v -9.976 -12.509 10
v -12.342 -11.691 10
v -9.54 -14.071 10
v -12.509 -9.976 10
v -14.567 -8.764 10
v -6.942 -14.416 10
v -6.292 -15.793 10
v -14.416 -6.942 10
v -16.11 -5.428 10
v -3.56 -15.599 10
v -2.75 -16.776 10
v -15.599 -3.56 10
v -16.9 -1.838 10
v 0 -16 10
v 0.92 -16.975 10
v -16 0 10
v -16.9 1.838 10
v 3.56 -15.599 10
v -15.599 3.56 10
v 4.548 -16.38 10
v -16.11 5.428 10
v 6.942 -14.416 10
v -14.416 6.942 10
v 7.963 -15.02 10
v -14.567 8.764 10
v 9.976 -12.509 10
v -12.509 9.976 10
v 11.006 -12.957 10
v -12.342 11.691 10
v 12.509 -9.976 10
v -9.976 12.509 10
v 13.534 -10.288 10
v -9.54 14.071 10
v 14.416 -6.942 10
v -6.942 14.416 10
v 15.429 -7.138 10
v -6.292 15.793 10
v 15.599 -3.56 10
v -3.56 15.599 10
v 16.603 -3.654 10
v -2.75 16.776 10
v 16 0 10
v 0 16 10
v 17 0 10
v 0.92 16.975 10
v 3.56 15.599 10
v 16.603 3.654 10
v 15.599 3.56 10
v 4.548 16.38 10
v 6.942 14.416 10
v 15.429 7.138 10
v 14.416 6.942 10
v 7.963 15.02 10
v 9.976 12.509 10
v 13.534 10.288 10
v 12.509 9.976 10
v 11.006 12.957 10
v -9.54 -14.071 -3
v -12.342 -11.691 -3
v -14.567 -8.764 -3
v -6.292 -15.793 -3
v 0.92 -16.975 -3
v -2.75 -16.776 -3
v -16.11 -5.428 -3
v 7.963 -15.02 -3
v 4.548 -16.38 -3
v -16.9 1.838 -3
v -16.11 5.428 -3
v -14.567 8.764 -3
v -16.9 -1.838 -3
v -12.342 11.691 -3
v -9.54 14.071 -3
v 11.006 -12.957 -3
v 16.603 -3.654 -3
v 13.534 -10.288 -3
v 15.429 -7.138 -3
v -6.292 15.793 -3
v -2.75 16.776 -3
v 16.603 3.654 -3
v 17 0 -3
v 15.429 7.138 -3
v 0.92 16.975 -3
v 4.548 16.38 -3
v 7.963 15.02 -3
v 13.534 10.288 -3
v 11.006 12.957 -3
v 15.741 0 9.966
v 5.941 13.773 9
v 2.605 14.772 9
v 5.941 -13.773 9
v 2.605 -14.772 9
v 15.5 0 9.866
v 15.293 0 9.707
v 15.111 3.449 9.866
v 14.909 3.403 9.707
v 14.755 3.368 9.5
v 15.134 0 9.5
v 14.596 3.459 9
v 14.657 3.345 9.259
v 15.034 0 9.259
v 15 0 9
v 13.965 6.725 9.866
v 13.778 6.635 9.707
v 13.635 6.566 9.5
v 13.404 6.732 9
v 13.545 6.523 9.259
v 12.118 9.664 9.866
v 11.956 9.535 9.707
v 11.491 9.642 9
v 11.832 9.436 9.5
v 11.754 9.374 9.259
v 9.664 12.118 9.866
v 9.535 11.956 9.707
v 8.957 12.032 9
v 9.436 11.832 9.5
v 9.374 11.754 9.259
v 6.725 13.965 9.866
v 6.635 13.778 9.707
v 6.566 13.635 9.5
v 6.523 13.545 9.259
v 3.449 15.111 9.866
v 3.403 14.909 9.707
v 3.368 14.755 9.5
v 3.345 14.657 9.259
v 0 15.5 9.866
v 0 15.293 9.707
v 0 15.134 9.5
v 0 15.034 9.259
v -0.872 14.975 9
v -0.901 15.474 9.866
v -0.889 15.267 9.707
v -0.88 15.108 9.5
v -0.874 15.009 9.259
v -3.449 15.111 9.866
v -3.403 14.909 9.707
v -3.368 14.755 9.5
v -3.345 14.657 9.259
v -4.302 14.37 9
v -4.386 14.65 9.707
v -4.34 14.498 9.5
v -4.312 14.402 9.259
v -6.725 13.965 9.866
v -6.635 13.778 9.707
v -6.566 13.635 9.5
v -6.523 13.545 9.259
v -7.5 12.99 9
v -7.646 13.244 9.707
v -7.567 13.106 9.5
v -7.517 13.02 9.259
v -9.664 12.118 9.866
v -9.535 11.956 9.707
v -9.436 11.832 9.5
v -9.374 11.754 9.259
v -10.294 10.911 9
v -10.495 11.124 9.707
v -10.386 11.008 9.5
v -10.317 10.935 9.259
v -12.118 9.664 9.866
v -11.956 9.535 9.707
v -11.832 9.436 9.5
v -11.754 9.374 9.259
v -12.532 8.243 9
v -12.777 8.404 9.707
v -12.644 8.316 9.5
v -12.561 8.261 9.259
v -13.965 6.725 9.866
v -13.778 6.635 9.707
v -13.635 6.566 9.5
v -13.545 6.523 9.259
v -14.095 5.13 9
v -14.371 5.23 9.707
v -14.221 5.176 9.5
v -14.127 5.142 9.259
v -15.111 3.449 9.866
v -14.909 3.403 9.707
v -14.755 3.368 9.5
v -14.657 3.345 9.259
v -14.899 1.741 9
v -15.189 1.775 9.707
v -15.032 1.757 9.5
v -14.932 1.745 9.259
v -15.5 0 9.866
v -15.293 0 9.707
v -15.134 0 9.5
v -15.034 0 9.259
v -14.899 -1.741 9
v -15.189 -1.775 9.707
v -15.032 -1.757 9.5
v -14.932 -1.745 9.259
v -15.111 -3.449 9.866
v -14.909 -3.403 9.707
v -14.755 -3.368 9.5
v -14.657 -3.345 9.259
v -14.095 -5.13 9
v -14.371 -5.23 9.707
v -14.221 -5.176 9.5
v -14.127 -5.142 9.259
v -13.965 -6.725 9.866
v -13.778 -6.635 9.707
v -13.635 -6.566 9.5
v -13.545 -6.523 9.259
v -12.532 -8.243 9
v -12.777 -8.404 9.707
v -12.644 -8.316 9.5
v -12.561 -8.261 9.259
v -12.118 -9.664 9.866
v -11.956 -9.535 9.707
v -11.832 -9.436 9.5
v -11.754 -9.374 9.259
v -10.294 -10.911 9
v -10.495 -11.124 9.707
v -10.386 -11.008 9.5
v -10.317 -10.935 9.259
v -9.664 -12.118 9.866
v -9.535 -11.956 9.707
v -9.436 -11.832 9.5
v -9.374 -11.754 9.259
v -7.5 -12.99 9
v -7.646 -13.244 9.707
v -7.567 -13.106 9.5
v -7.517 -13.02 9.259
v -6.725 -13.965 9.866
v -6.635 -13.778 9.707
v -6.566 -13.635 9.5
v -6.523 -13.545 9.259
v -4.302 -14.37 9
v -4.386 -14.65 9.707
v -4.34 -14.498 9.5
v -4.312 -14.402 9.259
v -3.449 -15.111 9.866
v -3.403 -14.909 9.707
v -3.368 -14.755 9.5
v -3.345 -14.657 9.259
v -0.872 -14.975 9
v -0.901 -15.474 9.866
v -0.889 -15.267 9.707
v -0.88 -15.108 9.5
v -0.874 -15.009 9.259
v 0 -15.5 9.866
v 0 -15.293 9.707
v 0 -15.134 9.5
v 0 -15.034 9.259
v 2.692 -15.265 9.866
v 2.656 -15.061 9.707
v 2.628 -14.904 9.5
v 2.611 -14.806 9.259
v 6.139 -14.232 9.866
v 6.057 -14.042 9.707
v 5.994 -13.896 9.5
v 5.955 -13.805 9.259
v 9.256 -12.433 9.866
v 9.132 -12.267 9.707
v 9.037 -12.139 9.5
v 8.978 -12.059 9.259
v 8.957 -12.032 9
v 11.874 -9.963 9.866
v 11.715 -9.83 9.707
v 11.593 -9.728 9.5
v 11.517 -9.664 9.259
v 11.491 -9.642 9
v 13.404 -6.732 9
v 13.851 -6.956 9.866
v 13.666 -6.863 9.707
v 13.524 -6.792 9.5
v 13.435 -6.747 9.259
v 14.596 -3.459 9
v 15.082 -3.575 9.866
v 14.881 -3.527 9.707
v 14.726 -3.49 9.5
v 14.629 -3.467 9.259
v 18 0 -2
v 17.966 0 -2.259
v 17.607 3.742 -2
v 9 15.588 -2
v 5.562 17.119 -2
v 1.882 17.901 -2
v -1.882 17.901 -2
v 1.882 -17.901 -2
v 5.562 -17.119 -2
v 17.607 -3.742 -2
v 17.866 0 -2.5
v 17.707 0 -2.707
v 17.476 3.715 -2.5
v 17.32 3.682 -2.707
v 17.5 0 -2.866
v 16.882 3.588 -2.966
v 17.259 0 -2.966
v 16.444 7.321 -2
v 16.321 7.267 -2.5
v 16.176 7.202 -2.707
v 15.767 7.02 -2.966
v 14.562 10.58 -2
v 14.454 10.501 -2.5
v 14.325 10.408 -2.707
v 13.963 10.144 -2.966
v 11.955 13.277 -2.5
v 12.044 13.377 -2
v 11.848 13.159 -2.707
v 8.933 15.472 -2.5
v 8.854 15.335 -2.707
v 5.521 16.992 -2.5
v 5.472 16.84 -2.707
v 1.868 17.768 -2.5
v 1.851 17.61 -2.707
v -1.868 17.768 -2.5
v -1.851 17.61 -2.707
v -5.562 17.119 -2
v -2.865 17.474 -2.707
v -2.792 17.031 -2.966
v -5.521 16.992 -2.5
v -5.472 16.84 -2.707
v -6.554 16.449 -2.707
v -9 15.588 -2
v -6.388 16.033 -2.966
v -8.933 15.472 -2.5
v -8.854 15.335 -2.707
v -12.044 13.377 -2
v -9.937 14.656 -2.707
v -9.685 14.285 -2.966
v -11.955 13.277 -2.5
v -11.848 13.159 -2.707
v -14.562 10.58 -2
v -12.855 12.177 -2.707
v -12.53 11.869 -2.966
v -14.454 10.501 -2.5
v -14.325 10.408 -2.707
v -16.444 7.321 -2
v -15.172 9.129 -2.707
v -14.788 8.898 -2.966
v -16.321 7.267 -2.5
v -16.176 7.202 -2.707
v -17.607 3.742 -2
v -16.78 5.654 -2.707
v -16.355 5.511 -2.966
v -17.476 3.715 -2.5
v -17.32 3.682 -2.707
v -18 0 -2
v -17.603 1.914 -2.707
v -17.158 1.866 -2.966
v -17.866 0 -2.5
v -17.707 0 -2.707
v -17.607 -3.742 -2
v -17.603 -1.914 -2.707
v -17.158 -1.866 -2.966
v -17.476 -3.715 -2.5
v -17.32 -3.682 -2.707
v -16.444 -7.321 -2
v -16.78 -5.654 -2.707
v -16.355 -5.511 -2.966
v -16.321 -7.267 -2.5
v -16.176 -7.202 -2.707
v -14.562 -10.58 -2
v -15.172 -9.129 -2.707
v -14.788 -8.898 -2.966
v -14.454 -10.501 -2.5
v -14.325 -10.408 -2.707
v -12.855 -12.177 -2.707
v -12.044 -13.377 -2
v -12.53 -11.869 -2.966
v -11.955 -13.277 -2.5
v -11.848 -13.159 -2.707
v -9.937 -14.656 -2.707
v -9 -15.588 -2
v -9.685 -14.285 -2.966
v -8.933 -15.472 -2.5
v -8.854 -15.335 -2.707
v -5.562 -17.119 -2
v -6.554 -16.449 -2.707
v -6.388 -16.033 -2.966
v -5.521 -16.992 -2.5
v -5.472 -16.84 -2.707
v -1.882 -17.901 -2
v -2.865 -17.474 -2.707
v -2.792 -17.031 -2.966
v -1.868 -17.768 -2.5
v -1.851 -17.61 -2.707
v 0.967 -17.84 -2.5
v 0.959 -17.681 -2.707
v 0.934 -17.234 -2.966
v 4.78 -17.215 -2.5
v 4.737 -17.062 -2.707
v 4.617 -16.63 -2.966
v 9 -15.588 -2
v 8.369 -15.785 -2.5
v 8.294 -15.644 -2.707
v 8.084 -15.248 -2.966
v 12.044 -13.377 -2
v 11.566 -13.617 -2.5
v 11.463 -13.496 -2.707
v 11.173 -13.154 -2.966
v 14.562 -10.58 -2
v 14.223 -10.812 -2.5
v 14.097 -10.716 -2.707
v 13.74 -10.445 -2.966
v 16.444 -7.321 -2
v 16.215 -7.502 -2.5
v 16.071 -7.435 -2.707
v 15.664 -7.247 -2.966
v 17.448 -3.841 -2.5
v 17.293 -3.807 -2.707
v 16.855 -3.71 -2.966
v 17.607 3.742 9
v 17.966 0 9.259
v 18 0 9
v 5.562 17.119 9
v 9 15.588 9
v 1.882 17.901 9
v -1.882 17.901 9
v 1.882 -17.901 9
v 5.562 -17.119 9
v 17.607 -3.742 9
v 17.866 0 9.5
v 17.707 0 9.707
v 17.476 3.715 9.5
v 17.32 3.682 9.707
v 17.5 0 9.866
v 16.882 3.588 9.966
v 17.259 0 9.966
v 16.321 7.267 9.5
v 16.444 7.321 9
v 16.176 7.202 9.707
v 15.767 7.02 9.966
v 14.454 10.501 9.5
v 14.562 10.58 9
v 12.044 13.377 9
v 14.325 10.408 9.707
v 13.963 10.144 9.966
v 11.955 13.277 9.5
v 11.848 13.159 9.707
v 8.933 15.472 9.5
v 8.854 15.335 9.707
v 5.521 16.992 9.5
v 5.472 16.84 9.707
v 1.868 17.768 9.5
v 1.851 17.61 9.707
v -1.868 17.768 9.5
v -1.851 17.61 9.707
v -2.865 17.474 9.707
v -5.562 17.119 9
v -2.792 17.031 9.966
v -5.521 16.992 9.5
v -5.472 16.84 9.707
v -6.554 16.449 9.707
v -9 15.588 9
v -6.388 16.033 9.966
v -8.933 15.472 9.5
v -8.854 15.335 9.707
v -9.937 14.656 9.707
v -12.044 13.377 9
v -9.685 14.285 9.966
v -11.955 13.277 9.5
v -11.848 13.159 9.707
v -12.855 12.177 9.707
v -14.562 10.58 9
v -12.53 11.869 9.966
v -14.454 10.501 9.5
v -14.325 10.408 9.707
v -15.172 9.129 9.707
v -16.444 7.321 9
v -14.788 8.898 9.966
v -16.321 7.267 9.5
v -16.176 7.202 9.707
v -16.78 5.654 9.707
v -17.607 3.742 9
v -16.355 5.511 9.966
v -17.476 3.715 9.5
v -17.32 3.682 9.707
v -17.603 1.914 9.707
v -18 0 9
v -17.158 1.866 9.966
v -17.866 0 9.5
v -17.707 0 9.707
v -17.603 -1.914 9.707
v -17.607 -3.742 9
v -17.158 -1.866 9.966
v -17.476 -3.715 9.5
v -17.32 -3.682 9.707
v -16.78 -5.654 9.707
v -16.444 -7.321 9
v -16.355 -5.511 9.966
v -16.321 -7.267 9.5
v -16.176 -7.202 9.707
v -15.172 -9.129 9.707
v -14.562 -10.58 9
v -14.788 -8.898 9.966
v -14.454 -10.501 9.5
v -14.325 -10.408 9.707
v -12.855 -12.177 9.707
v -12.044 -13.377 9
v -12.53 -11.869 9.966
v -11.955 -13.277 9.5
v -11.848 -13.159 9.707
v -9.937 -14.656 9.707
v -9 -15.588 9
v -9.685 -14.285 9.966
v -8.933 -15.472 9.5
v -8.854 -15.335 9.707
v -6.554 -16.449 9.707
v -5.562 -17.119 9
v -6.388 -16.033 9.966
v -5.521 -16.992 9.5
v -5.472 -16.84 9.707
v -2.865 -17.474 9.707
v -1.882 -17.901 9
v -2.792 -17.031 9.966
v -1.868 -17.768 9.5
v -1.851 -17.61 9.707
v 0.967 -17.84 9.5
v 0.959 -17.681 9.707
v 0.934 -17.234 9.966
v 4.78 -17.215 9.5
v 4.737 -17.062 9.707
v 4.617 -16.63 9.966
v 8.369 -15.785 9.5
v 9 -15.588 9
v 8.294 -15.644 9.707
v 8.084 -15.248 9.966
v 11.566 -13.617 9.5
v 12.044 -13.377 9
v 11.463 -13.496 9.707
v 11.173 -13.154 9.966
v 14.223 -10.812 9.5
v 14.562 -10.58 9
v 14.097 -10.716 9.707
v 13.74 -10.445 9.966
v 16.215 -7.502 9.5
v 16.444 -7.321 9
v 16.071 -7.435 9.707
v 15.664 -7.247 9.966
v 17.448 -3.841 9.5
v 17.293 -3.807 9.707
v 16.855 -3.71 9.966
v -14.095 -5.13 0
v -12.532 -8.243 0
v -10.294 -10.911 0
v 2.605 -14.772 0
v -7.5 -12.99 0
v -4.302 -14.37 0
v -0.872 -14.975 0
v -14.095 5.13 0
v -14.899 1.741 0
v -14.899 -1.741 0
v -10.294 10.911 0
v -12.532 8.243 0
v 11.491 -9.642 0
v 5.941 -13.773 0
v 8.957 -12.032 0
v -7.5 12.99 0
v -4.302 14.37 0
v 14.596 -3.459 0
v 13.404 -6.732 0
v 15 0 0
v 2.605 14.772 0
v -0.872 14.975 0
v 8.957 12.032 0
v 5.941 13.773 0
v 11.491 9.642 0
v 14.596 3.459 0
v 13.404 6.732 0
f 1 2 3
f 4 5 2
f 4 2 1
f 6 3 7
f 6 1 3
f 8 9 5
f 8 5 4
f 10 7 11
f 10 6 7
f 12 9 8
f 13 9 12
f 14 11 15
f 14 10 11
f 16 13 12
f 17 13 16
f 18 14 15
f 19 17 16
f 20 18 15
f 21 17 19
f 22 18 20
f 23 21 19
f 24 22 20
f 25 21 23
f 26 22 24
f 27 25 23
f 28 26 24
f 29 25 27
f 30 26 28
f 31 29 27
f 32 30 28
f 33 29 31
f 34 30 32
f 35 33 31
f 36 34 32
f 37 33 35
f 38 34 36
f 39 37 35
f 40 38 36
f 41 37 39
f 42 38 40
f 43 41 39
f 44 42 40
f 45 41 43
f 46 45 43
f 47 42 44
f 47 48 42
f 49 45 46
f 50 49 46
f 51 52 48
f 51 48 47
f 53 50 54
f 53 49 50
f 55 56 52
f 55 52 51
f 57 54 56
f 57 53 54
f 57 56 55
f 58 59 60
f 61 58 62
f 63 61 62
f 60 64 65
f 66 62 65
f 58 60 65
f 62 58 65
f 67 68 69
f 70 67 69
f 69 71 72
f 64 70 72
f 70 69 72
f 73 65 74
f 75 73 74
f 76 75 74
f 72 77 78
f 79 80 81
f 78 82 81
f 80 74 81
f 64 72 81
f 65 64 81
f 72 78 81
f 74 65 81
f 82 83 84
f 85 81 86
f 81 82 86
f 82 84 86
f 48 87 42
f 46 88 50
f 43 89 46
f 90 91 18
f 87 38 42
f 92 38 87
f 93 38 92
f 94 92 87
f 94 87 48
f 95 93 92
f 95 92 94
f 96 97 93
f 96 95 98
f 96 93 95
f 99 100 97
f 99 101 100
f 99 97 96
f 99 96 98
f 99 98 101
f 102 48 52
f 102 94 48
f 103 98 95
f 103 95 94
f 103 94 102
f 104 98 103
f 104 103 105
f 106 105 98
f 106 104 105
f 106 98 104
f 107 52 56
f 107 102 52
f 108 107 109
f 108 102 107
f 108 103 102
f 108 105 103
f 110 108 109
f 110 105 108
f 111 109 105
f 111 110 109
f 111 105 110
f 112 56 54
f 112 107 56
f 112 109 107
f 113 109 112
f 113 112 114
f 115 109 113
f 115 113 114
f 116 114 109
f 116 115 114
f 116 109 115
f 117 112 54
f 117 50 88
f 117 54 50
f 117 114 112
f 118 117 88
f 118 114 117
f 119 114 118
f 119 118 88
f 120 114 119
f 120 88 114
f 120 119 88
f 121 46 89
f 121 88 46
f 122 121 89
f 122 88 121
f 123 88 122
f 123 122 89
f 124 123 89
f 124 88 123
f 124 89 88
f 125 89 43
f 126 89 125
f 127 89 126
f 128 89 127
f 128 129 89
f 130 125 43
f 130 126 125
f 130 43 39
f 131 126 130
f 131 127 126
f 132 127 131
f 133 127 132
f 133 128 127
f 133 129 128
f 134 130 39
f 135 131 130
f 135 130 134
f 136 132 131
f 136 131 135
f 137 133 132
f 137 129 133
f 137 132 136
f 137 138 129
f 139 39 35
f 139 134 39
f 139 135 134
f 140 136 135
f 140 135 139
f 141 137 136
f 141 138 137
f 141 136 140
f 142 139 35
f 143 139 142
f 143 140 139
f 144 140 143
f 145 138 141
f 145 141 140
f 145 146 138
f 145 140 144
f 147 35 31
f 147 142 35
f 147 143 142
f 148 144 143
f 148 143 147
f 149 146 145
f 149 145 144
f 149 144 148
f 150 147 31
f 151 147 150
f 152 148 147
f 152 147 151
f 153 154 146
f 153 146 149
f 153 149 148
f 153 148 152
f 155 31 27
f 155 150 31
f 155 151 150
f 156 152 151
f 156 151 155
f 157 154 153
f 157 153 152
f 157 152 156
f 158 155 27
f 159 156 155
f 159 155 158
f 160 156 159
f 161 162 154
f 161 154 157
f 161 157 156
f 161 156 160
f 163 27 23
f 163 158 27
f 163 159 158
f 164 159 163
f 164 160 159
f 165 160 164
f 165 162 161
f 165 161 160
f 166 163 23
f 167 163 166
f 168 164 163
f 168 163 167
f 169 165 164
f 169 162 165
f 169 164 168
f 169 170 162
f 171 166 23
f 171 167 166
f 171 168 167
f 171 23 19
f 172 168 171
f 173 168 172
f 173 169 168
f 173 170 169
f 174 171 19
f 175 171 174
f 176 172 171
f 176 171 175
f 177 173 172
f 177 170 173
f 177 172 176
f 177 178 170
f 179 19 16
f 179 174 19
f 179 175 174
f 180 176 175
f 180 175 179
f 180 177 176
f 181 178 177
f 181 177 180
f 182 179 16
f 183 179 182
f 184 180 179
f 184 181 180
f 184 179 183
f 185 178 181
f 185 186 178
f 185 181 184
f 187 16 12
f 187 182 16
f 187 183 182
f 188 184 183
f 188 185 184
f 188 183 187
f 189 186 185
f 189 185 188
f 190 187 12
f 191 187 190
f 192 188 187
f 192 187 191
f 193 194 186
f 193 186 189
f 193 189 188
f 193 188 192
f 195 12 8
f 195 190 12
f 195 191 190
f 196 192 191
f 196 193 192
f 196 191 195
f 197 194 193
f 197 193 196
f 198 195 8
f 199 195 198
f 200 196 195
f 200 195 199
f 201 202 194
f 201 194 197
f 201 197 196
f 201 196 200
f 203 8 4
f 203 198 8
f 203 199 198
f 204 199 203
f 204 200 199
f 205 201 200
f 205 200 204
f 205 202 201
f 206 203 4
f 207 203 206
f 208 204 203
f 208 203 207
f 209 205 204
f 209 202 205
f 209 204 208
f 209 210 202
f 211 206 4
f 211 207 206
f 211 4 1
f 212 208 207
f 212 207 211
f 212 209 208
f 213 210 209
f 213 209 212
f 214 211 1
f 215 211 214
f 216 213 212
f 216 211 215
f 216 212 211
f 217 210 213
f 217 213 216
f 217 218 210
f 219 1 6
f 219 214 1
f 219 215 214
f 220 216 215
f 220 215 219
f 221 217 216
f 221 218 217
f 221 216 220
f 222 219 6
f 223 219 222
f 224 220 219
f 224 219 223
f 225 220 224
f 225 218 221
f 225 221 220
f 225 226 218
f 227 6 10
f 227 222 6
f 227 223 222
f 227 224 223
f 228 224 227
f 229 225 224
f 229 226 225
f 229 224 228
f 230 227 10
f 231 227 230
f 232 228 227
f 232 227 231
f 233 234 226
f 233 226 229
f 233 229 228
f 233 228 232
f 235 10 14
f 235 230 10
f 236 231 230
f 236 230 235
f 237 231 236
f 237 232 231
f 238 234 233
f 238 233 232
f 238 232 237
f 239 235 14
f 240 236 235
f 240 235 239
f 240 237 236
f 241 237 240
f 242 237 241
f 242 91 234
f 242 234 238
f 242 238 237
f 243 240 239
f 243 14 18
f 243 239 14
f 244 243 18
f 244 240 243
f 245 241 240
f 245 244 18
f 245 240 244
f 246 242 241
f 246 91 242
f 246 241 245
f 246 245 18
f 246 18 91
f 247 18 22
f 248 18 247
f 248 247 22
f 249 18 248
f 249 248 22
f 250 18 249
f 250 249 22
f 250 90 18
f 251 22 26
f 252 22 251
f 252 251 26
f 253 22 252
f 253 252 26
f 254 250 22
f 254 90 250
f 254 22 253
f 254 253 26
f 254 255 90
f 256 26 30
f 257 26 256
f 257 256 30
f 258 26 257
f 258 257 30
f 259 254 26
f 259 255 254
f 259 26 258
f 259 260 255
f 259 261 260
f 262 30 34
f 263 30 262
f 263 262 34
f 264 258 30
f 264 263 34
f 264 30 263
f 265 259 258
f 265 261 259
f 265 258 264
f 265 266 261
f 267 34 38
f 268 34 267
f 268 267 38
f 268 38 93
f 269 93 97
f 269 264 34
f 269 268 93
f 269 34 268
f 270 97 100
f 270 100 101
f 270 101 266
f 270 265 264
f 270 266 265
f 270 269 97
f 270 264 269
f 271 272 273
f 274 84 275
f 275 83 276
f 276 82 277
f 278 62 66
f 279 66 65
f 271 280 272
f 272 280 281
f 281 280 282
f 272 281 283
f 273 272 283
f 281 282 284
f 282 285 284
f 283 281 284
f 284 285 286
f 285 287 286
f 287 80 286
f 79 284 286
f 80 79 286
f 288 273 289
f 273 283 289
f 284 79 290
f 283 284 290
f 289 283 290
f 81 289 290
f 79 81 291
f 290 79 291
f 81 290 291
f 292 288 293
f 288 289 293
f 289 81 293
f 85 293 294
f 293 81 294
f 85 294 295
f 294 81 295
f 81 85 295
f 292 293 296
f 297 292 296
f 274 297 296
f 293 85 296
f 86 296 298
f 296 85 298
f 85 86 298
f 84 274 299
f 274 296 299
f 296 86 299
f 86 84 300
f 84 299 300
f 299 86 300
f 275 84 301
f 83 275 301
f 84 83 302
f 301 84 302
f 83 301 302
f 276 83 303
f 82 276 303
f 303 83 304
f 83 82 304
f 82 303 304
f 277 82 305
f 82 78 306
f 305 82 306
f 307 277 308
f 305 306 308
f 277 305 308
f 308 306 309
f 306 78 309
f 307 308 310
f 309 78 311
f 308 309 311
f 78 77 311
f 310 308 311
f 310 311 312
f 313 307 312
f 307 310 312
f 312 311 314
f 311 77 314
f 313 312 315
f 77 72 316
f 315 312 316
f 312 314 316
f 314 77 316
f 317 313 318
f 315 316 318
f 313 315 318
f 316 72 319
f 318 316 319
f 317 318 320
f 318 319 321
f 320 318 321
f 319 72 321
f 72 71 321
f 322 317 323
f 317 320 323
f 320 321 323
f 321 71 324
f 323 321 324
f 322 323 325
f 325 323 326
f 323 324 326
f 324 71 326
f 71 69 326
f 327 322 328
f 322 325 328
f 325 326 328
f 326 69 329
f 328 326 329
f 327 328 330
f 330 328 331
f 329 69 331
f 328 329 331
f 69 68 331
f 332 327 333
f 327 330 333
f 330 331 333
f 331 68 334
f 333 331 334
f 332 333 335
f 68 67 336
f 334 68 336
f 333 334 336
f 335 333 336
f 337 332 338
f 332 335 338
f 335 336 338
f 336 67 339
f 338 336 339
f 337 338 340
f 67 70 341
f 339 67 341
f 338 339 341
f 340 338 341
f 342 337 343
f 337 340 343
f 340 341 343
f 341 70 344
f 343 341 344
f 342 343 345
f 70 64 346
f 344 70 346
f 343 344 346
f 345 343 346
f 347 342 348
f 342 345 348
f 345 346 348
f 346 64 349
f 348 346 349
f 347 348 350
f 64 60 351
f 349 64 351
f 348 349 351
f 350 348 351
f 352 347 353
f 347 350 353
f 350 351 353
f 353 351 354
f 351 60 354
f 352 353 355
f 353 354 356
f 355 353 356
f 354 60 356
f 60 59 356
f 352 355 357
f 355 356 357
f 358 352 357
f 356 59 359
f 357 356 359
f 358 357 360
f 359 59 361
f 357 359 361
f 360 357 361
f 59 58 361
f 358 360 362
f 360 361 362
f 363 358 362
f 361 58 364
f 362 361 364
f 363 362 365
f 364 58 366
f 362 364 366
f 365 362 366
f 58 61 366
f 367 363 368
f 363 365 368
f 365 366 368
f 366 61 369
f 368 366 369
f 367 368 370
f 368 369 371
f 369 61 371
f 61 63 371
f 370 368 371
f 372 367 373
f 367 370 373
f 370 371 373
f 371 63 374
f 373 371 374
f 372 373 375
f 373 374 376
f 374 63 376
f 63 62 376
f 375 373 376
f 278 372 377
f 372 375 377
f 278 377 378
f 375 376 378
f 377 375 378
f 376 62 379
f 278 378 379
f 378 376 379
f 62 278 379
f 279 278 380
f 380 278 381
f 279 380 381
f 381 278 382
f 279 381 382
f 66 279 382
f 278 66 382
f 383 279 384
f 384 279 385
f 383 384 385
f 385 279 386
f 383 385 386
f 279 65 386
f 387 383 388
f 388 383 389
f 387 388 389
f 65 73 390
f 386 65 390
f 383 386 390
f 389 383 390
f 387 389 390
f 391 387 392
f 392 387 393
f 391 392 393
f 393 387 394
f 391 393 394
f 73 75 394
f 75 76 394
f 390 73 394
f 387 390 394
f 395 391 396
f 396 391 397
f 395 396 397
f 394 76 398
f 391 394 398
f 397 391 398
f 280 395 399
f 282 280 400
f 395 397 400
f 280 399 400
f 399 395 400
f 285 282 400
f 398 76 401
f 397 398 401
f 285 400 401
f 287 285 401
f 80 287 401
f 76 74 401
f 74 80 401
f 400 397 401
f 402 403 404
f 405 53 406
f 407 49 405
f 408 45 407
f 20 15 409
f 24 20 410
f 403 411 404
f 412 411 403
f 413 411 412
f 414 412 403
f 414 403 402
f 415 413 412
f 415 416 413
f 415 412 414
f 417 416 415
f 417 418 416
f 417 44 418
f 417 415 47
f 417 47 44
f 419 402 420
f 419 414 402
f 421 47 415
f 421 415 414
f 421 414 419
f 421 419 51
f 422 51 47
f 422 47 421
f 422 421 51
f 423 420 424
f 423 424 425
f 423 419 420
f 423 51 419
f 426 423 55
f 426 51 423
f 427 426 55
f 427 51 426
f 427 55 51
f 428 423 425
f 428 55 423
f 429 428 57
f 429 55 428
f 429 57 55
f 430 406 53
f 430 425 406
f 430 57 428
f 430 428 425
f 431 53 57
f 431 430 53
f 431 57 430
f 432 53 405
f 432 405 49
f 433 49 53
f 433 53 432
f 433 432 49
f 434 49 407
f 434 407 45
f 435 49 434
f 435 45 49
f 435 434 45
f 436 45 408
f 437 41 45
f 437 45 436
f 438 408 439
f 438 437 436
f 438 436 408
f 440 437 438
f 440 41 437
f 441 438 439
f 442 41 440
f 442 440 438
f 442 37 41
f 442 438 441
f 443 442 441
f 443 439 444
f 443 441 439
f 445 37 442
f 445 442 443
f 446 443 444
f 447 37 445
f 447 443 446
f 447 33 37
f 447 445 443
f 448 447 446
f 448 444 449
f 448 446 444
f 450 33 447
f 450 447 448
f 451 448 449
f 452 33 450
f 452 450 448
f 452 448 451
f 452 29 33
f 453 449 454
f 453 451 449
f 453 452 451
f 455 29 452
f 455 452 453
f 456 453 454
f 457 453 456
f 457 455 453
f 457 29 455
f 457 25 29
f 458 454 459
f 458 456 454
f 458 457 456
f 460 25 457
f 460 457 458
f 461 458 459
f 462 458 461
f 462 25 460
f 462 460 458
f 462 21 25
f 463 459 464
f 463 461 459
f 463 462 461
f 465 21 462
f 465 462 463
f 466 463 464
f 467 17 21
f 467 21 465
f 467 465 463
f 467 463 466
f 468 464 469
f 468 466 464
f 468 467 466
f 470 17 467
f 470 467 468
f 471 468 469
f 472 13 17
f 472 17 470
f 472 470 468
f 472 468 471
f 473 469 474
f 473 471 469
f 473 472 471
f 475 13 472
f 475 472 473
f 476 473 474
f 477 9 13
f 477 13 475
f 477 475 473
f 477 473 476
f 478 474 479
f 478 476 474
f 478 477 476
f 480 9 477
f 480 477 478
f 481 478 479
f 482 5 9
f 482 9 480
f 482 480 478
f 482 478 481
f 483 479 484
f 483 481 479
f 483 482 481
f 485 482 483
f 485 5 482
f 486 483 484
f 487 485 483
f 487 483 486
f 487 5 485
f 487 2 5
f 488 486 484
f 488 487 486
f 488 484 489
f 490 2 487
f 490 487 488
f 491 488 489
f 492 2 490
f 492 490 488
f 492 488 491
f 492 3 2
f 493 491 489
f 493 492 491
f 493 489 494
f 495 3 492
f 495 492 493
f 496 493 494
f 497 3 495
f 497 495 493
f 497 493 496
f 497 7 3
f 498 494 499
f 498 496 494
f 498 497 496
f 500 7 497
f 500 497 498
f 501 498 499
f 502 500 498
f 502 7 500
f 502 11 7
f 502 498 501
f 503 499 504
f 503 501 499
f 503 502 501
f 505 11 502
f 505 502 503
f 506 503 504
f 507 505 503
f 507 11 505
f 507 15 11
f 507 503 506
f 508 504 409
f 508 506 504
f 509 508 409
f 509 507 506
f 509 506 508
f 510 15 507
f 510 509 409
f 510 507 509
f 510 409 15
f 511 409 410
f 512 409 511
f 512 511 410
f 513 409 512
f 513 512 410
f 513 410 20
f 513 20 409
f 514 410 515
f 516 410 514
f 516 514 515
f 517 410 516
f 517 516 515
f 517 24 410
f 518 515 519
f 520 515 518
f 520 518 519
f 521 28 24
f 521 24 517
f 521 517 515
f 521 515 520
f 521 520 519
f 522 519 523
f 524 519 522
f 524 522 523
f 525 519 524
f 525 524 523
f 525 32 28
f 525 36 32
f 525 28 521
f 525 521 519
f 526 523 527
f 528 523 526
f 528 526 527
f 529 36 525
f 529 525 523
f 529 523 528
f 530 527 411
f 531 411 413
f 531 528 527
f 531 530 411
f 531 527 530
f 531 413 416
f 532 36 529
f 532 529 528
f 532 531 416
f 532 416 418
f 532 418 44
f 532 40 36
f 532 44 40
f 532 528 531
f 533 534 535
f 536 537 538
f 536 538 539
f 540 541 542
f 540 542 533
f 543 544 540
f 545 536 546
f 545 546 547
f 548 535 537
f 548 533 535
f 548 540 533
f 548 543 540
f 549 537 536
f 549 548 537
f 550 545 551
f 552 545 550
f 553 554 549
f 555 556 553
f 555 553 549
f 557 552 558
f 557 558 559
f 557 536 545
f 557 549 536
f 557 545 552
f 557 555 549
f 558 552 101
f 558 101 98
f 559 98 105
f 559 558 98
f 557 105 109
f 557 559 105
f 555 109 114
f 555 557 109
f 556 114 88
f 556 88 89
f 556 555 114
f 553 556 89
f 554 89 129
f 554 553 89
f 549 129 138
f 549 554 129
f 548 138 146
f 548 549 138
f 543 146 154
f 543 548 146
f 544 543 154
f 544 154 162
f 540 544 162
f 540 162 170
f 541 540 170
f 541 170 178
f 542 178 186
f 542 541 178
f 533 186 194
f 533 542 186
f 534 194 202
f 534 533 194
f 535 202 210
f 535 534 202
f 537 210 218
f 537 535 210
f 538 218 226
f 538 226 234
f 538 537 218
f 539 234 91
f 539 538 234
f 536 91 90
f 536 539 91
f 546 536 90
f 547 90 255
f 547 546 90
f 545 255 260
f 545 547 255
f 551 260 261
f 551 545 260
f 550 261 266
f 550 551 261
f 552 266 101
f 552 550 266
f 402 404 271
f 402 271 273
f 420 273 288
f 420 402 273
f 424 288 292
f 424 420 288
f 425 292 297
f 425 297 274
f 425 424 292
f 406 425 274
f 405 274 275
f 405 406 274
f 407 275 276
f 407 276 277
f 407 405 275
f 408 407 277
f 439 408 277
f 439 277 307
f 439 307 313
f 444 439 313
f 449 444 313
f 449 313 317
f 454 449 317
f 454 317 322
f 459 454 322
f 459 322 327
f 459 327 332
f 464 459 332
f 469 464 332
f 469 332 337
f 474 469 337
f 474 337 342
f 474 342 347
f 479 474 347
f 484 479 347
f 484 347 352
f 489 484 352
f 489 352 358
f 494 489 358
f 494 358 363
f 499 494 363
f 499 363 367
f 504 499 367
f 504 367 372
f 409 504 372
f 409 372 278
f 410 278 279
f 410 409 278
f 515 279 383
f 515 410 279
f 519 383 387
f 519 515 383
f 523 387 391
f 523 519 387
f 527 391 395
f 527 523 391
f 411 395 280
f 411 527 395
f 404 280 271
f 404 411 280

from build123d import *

# Parameters (mm, degrees)
F0_R     = 18
F0_R_2   = 15
F1_DEPTH = 10
F2_R     = 18
F3_DEPTH = 3
F4_R     = 1


with BuildPart() as f1:
    # F0 (on Top) → F1 (new body)
    with BuildSketch(Plane.XY):
        Circle(F0_R)
        Circle(F0_R_2, mode=Mode.SUBTRACT)
    extrude(amount=F1_DEPTH)

    # F2 (on face) → F3 (join)
    with BuildSketch(Plane.XY):
        Circle(F2_R)
    extrude(amount=-F3_DEPTH)

    # F4
    f4_edges = [f1.edges().sort_by_distance(p)[0] for p in [
        (-18, 0, 10),
        (-15, 0, 10),
        (-18, 0, -3),
    ]]
    fillet(f4_edges, radius=F4_R)


solid = f1.part
